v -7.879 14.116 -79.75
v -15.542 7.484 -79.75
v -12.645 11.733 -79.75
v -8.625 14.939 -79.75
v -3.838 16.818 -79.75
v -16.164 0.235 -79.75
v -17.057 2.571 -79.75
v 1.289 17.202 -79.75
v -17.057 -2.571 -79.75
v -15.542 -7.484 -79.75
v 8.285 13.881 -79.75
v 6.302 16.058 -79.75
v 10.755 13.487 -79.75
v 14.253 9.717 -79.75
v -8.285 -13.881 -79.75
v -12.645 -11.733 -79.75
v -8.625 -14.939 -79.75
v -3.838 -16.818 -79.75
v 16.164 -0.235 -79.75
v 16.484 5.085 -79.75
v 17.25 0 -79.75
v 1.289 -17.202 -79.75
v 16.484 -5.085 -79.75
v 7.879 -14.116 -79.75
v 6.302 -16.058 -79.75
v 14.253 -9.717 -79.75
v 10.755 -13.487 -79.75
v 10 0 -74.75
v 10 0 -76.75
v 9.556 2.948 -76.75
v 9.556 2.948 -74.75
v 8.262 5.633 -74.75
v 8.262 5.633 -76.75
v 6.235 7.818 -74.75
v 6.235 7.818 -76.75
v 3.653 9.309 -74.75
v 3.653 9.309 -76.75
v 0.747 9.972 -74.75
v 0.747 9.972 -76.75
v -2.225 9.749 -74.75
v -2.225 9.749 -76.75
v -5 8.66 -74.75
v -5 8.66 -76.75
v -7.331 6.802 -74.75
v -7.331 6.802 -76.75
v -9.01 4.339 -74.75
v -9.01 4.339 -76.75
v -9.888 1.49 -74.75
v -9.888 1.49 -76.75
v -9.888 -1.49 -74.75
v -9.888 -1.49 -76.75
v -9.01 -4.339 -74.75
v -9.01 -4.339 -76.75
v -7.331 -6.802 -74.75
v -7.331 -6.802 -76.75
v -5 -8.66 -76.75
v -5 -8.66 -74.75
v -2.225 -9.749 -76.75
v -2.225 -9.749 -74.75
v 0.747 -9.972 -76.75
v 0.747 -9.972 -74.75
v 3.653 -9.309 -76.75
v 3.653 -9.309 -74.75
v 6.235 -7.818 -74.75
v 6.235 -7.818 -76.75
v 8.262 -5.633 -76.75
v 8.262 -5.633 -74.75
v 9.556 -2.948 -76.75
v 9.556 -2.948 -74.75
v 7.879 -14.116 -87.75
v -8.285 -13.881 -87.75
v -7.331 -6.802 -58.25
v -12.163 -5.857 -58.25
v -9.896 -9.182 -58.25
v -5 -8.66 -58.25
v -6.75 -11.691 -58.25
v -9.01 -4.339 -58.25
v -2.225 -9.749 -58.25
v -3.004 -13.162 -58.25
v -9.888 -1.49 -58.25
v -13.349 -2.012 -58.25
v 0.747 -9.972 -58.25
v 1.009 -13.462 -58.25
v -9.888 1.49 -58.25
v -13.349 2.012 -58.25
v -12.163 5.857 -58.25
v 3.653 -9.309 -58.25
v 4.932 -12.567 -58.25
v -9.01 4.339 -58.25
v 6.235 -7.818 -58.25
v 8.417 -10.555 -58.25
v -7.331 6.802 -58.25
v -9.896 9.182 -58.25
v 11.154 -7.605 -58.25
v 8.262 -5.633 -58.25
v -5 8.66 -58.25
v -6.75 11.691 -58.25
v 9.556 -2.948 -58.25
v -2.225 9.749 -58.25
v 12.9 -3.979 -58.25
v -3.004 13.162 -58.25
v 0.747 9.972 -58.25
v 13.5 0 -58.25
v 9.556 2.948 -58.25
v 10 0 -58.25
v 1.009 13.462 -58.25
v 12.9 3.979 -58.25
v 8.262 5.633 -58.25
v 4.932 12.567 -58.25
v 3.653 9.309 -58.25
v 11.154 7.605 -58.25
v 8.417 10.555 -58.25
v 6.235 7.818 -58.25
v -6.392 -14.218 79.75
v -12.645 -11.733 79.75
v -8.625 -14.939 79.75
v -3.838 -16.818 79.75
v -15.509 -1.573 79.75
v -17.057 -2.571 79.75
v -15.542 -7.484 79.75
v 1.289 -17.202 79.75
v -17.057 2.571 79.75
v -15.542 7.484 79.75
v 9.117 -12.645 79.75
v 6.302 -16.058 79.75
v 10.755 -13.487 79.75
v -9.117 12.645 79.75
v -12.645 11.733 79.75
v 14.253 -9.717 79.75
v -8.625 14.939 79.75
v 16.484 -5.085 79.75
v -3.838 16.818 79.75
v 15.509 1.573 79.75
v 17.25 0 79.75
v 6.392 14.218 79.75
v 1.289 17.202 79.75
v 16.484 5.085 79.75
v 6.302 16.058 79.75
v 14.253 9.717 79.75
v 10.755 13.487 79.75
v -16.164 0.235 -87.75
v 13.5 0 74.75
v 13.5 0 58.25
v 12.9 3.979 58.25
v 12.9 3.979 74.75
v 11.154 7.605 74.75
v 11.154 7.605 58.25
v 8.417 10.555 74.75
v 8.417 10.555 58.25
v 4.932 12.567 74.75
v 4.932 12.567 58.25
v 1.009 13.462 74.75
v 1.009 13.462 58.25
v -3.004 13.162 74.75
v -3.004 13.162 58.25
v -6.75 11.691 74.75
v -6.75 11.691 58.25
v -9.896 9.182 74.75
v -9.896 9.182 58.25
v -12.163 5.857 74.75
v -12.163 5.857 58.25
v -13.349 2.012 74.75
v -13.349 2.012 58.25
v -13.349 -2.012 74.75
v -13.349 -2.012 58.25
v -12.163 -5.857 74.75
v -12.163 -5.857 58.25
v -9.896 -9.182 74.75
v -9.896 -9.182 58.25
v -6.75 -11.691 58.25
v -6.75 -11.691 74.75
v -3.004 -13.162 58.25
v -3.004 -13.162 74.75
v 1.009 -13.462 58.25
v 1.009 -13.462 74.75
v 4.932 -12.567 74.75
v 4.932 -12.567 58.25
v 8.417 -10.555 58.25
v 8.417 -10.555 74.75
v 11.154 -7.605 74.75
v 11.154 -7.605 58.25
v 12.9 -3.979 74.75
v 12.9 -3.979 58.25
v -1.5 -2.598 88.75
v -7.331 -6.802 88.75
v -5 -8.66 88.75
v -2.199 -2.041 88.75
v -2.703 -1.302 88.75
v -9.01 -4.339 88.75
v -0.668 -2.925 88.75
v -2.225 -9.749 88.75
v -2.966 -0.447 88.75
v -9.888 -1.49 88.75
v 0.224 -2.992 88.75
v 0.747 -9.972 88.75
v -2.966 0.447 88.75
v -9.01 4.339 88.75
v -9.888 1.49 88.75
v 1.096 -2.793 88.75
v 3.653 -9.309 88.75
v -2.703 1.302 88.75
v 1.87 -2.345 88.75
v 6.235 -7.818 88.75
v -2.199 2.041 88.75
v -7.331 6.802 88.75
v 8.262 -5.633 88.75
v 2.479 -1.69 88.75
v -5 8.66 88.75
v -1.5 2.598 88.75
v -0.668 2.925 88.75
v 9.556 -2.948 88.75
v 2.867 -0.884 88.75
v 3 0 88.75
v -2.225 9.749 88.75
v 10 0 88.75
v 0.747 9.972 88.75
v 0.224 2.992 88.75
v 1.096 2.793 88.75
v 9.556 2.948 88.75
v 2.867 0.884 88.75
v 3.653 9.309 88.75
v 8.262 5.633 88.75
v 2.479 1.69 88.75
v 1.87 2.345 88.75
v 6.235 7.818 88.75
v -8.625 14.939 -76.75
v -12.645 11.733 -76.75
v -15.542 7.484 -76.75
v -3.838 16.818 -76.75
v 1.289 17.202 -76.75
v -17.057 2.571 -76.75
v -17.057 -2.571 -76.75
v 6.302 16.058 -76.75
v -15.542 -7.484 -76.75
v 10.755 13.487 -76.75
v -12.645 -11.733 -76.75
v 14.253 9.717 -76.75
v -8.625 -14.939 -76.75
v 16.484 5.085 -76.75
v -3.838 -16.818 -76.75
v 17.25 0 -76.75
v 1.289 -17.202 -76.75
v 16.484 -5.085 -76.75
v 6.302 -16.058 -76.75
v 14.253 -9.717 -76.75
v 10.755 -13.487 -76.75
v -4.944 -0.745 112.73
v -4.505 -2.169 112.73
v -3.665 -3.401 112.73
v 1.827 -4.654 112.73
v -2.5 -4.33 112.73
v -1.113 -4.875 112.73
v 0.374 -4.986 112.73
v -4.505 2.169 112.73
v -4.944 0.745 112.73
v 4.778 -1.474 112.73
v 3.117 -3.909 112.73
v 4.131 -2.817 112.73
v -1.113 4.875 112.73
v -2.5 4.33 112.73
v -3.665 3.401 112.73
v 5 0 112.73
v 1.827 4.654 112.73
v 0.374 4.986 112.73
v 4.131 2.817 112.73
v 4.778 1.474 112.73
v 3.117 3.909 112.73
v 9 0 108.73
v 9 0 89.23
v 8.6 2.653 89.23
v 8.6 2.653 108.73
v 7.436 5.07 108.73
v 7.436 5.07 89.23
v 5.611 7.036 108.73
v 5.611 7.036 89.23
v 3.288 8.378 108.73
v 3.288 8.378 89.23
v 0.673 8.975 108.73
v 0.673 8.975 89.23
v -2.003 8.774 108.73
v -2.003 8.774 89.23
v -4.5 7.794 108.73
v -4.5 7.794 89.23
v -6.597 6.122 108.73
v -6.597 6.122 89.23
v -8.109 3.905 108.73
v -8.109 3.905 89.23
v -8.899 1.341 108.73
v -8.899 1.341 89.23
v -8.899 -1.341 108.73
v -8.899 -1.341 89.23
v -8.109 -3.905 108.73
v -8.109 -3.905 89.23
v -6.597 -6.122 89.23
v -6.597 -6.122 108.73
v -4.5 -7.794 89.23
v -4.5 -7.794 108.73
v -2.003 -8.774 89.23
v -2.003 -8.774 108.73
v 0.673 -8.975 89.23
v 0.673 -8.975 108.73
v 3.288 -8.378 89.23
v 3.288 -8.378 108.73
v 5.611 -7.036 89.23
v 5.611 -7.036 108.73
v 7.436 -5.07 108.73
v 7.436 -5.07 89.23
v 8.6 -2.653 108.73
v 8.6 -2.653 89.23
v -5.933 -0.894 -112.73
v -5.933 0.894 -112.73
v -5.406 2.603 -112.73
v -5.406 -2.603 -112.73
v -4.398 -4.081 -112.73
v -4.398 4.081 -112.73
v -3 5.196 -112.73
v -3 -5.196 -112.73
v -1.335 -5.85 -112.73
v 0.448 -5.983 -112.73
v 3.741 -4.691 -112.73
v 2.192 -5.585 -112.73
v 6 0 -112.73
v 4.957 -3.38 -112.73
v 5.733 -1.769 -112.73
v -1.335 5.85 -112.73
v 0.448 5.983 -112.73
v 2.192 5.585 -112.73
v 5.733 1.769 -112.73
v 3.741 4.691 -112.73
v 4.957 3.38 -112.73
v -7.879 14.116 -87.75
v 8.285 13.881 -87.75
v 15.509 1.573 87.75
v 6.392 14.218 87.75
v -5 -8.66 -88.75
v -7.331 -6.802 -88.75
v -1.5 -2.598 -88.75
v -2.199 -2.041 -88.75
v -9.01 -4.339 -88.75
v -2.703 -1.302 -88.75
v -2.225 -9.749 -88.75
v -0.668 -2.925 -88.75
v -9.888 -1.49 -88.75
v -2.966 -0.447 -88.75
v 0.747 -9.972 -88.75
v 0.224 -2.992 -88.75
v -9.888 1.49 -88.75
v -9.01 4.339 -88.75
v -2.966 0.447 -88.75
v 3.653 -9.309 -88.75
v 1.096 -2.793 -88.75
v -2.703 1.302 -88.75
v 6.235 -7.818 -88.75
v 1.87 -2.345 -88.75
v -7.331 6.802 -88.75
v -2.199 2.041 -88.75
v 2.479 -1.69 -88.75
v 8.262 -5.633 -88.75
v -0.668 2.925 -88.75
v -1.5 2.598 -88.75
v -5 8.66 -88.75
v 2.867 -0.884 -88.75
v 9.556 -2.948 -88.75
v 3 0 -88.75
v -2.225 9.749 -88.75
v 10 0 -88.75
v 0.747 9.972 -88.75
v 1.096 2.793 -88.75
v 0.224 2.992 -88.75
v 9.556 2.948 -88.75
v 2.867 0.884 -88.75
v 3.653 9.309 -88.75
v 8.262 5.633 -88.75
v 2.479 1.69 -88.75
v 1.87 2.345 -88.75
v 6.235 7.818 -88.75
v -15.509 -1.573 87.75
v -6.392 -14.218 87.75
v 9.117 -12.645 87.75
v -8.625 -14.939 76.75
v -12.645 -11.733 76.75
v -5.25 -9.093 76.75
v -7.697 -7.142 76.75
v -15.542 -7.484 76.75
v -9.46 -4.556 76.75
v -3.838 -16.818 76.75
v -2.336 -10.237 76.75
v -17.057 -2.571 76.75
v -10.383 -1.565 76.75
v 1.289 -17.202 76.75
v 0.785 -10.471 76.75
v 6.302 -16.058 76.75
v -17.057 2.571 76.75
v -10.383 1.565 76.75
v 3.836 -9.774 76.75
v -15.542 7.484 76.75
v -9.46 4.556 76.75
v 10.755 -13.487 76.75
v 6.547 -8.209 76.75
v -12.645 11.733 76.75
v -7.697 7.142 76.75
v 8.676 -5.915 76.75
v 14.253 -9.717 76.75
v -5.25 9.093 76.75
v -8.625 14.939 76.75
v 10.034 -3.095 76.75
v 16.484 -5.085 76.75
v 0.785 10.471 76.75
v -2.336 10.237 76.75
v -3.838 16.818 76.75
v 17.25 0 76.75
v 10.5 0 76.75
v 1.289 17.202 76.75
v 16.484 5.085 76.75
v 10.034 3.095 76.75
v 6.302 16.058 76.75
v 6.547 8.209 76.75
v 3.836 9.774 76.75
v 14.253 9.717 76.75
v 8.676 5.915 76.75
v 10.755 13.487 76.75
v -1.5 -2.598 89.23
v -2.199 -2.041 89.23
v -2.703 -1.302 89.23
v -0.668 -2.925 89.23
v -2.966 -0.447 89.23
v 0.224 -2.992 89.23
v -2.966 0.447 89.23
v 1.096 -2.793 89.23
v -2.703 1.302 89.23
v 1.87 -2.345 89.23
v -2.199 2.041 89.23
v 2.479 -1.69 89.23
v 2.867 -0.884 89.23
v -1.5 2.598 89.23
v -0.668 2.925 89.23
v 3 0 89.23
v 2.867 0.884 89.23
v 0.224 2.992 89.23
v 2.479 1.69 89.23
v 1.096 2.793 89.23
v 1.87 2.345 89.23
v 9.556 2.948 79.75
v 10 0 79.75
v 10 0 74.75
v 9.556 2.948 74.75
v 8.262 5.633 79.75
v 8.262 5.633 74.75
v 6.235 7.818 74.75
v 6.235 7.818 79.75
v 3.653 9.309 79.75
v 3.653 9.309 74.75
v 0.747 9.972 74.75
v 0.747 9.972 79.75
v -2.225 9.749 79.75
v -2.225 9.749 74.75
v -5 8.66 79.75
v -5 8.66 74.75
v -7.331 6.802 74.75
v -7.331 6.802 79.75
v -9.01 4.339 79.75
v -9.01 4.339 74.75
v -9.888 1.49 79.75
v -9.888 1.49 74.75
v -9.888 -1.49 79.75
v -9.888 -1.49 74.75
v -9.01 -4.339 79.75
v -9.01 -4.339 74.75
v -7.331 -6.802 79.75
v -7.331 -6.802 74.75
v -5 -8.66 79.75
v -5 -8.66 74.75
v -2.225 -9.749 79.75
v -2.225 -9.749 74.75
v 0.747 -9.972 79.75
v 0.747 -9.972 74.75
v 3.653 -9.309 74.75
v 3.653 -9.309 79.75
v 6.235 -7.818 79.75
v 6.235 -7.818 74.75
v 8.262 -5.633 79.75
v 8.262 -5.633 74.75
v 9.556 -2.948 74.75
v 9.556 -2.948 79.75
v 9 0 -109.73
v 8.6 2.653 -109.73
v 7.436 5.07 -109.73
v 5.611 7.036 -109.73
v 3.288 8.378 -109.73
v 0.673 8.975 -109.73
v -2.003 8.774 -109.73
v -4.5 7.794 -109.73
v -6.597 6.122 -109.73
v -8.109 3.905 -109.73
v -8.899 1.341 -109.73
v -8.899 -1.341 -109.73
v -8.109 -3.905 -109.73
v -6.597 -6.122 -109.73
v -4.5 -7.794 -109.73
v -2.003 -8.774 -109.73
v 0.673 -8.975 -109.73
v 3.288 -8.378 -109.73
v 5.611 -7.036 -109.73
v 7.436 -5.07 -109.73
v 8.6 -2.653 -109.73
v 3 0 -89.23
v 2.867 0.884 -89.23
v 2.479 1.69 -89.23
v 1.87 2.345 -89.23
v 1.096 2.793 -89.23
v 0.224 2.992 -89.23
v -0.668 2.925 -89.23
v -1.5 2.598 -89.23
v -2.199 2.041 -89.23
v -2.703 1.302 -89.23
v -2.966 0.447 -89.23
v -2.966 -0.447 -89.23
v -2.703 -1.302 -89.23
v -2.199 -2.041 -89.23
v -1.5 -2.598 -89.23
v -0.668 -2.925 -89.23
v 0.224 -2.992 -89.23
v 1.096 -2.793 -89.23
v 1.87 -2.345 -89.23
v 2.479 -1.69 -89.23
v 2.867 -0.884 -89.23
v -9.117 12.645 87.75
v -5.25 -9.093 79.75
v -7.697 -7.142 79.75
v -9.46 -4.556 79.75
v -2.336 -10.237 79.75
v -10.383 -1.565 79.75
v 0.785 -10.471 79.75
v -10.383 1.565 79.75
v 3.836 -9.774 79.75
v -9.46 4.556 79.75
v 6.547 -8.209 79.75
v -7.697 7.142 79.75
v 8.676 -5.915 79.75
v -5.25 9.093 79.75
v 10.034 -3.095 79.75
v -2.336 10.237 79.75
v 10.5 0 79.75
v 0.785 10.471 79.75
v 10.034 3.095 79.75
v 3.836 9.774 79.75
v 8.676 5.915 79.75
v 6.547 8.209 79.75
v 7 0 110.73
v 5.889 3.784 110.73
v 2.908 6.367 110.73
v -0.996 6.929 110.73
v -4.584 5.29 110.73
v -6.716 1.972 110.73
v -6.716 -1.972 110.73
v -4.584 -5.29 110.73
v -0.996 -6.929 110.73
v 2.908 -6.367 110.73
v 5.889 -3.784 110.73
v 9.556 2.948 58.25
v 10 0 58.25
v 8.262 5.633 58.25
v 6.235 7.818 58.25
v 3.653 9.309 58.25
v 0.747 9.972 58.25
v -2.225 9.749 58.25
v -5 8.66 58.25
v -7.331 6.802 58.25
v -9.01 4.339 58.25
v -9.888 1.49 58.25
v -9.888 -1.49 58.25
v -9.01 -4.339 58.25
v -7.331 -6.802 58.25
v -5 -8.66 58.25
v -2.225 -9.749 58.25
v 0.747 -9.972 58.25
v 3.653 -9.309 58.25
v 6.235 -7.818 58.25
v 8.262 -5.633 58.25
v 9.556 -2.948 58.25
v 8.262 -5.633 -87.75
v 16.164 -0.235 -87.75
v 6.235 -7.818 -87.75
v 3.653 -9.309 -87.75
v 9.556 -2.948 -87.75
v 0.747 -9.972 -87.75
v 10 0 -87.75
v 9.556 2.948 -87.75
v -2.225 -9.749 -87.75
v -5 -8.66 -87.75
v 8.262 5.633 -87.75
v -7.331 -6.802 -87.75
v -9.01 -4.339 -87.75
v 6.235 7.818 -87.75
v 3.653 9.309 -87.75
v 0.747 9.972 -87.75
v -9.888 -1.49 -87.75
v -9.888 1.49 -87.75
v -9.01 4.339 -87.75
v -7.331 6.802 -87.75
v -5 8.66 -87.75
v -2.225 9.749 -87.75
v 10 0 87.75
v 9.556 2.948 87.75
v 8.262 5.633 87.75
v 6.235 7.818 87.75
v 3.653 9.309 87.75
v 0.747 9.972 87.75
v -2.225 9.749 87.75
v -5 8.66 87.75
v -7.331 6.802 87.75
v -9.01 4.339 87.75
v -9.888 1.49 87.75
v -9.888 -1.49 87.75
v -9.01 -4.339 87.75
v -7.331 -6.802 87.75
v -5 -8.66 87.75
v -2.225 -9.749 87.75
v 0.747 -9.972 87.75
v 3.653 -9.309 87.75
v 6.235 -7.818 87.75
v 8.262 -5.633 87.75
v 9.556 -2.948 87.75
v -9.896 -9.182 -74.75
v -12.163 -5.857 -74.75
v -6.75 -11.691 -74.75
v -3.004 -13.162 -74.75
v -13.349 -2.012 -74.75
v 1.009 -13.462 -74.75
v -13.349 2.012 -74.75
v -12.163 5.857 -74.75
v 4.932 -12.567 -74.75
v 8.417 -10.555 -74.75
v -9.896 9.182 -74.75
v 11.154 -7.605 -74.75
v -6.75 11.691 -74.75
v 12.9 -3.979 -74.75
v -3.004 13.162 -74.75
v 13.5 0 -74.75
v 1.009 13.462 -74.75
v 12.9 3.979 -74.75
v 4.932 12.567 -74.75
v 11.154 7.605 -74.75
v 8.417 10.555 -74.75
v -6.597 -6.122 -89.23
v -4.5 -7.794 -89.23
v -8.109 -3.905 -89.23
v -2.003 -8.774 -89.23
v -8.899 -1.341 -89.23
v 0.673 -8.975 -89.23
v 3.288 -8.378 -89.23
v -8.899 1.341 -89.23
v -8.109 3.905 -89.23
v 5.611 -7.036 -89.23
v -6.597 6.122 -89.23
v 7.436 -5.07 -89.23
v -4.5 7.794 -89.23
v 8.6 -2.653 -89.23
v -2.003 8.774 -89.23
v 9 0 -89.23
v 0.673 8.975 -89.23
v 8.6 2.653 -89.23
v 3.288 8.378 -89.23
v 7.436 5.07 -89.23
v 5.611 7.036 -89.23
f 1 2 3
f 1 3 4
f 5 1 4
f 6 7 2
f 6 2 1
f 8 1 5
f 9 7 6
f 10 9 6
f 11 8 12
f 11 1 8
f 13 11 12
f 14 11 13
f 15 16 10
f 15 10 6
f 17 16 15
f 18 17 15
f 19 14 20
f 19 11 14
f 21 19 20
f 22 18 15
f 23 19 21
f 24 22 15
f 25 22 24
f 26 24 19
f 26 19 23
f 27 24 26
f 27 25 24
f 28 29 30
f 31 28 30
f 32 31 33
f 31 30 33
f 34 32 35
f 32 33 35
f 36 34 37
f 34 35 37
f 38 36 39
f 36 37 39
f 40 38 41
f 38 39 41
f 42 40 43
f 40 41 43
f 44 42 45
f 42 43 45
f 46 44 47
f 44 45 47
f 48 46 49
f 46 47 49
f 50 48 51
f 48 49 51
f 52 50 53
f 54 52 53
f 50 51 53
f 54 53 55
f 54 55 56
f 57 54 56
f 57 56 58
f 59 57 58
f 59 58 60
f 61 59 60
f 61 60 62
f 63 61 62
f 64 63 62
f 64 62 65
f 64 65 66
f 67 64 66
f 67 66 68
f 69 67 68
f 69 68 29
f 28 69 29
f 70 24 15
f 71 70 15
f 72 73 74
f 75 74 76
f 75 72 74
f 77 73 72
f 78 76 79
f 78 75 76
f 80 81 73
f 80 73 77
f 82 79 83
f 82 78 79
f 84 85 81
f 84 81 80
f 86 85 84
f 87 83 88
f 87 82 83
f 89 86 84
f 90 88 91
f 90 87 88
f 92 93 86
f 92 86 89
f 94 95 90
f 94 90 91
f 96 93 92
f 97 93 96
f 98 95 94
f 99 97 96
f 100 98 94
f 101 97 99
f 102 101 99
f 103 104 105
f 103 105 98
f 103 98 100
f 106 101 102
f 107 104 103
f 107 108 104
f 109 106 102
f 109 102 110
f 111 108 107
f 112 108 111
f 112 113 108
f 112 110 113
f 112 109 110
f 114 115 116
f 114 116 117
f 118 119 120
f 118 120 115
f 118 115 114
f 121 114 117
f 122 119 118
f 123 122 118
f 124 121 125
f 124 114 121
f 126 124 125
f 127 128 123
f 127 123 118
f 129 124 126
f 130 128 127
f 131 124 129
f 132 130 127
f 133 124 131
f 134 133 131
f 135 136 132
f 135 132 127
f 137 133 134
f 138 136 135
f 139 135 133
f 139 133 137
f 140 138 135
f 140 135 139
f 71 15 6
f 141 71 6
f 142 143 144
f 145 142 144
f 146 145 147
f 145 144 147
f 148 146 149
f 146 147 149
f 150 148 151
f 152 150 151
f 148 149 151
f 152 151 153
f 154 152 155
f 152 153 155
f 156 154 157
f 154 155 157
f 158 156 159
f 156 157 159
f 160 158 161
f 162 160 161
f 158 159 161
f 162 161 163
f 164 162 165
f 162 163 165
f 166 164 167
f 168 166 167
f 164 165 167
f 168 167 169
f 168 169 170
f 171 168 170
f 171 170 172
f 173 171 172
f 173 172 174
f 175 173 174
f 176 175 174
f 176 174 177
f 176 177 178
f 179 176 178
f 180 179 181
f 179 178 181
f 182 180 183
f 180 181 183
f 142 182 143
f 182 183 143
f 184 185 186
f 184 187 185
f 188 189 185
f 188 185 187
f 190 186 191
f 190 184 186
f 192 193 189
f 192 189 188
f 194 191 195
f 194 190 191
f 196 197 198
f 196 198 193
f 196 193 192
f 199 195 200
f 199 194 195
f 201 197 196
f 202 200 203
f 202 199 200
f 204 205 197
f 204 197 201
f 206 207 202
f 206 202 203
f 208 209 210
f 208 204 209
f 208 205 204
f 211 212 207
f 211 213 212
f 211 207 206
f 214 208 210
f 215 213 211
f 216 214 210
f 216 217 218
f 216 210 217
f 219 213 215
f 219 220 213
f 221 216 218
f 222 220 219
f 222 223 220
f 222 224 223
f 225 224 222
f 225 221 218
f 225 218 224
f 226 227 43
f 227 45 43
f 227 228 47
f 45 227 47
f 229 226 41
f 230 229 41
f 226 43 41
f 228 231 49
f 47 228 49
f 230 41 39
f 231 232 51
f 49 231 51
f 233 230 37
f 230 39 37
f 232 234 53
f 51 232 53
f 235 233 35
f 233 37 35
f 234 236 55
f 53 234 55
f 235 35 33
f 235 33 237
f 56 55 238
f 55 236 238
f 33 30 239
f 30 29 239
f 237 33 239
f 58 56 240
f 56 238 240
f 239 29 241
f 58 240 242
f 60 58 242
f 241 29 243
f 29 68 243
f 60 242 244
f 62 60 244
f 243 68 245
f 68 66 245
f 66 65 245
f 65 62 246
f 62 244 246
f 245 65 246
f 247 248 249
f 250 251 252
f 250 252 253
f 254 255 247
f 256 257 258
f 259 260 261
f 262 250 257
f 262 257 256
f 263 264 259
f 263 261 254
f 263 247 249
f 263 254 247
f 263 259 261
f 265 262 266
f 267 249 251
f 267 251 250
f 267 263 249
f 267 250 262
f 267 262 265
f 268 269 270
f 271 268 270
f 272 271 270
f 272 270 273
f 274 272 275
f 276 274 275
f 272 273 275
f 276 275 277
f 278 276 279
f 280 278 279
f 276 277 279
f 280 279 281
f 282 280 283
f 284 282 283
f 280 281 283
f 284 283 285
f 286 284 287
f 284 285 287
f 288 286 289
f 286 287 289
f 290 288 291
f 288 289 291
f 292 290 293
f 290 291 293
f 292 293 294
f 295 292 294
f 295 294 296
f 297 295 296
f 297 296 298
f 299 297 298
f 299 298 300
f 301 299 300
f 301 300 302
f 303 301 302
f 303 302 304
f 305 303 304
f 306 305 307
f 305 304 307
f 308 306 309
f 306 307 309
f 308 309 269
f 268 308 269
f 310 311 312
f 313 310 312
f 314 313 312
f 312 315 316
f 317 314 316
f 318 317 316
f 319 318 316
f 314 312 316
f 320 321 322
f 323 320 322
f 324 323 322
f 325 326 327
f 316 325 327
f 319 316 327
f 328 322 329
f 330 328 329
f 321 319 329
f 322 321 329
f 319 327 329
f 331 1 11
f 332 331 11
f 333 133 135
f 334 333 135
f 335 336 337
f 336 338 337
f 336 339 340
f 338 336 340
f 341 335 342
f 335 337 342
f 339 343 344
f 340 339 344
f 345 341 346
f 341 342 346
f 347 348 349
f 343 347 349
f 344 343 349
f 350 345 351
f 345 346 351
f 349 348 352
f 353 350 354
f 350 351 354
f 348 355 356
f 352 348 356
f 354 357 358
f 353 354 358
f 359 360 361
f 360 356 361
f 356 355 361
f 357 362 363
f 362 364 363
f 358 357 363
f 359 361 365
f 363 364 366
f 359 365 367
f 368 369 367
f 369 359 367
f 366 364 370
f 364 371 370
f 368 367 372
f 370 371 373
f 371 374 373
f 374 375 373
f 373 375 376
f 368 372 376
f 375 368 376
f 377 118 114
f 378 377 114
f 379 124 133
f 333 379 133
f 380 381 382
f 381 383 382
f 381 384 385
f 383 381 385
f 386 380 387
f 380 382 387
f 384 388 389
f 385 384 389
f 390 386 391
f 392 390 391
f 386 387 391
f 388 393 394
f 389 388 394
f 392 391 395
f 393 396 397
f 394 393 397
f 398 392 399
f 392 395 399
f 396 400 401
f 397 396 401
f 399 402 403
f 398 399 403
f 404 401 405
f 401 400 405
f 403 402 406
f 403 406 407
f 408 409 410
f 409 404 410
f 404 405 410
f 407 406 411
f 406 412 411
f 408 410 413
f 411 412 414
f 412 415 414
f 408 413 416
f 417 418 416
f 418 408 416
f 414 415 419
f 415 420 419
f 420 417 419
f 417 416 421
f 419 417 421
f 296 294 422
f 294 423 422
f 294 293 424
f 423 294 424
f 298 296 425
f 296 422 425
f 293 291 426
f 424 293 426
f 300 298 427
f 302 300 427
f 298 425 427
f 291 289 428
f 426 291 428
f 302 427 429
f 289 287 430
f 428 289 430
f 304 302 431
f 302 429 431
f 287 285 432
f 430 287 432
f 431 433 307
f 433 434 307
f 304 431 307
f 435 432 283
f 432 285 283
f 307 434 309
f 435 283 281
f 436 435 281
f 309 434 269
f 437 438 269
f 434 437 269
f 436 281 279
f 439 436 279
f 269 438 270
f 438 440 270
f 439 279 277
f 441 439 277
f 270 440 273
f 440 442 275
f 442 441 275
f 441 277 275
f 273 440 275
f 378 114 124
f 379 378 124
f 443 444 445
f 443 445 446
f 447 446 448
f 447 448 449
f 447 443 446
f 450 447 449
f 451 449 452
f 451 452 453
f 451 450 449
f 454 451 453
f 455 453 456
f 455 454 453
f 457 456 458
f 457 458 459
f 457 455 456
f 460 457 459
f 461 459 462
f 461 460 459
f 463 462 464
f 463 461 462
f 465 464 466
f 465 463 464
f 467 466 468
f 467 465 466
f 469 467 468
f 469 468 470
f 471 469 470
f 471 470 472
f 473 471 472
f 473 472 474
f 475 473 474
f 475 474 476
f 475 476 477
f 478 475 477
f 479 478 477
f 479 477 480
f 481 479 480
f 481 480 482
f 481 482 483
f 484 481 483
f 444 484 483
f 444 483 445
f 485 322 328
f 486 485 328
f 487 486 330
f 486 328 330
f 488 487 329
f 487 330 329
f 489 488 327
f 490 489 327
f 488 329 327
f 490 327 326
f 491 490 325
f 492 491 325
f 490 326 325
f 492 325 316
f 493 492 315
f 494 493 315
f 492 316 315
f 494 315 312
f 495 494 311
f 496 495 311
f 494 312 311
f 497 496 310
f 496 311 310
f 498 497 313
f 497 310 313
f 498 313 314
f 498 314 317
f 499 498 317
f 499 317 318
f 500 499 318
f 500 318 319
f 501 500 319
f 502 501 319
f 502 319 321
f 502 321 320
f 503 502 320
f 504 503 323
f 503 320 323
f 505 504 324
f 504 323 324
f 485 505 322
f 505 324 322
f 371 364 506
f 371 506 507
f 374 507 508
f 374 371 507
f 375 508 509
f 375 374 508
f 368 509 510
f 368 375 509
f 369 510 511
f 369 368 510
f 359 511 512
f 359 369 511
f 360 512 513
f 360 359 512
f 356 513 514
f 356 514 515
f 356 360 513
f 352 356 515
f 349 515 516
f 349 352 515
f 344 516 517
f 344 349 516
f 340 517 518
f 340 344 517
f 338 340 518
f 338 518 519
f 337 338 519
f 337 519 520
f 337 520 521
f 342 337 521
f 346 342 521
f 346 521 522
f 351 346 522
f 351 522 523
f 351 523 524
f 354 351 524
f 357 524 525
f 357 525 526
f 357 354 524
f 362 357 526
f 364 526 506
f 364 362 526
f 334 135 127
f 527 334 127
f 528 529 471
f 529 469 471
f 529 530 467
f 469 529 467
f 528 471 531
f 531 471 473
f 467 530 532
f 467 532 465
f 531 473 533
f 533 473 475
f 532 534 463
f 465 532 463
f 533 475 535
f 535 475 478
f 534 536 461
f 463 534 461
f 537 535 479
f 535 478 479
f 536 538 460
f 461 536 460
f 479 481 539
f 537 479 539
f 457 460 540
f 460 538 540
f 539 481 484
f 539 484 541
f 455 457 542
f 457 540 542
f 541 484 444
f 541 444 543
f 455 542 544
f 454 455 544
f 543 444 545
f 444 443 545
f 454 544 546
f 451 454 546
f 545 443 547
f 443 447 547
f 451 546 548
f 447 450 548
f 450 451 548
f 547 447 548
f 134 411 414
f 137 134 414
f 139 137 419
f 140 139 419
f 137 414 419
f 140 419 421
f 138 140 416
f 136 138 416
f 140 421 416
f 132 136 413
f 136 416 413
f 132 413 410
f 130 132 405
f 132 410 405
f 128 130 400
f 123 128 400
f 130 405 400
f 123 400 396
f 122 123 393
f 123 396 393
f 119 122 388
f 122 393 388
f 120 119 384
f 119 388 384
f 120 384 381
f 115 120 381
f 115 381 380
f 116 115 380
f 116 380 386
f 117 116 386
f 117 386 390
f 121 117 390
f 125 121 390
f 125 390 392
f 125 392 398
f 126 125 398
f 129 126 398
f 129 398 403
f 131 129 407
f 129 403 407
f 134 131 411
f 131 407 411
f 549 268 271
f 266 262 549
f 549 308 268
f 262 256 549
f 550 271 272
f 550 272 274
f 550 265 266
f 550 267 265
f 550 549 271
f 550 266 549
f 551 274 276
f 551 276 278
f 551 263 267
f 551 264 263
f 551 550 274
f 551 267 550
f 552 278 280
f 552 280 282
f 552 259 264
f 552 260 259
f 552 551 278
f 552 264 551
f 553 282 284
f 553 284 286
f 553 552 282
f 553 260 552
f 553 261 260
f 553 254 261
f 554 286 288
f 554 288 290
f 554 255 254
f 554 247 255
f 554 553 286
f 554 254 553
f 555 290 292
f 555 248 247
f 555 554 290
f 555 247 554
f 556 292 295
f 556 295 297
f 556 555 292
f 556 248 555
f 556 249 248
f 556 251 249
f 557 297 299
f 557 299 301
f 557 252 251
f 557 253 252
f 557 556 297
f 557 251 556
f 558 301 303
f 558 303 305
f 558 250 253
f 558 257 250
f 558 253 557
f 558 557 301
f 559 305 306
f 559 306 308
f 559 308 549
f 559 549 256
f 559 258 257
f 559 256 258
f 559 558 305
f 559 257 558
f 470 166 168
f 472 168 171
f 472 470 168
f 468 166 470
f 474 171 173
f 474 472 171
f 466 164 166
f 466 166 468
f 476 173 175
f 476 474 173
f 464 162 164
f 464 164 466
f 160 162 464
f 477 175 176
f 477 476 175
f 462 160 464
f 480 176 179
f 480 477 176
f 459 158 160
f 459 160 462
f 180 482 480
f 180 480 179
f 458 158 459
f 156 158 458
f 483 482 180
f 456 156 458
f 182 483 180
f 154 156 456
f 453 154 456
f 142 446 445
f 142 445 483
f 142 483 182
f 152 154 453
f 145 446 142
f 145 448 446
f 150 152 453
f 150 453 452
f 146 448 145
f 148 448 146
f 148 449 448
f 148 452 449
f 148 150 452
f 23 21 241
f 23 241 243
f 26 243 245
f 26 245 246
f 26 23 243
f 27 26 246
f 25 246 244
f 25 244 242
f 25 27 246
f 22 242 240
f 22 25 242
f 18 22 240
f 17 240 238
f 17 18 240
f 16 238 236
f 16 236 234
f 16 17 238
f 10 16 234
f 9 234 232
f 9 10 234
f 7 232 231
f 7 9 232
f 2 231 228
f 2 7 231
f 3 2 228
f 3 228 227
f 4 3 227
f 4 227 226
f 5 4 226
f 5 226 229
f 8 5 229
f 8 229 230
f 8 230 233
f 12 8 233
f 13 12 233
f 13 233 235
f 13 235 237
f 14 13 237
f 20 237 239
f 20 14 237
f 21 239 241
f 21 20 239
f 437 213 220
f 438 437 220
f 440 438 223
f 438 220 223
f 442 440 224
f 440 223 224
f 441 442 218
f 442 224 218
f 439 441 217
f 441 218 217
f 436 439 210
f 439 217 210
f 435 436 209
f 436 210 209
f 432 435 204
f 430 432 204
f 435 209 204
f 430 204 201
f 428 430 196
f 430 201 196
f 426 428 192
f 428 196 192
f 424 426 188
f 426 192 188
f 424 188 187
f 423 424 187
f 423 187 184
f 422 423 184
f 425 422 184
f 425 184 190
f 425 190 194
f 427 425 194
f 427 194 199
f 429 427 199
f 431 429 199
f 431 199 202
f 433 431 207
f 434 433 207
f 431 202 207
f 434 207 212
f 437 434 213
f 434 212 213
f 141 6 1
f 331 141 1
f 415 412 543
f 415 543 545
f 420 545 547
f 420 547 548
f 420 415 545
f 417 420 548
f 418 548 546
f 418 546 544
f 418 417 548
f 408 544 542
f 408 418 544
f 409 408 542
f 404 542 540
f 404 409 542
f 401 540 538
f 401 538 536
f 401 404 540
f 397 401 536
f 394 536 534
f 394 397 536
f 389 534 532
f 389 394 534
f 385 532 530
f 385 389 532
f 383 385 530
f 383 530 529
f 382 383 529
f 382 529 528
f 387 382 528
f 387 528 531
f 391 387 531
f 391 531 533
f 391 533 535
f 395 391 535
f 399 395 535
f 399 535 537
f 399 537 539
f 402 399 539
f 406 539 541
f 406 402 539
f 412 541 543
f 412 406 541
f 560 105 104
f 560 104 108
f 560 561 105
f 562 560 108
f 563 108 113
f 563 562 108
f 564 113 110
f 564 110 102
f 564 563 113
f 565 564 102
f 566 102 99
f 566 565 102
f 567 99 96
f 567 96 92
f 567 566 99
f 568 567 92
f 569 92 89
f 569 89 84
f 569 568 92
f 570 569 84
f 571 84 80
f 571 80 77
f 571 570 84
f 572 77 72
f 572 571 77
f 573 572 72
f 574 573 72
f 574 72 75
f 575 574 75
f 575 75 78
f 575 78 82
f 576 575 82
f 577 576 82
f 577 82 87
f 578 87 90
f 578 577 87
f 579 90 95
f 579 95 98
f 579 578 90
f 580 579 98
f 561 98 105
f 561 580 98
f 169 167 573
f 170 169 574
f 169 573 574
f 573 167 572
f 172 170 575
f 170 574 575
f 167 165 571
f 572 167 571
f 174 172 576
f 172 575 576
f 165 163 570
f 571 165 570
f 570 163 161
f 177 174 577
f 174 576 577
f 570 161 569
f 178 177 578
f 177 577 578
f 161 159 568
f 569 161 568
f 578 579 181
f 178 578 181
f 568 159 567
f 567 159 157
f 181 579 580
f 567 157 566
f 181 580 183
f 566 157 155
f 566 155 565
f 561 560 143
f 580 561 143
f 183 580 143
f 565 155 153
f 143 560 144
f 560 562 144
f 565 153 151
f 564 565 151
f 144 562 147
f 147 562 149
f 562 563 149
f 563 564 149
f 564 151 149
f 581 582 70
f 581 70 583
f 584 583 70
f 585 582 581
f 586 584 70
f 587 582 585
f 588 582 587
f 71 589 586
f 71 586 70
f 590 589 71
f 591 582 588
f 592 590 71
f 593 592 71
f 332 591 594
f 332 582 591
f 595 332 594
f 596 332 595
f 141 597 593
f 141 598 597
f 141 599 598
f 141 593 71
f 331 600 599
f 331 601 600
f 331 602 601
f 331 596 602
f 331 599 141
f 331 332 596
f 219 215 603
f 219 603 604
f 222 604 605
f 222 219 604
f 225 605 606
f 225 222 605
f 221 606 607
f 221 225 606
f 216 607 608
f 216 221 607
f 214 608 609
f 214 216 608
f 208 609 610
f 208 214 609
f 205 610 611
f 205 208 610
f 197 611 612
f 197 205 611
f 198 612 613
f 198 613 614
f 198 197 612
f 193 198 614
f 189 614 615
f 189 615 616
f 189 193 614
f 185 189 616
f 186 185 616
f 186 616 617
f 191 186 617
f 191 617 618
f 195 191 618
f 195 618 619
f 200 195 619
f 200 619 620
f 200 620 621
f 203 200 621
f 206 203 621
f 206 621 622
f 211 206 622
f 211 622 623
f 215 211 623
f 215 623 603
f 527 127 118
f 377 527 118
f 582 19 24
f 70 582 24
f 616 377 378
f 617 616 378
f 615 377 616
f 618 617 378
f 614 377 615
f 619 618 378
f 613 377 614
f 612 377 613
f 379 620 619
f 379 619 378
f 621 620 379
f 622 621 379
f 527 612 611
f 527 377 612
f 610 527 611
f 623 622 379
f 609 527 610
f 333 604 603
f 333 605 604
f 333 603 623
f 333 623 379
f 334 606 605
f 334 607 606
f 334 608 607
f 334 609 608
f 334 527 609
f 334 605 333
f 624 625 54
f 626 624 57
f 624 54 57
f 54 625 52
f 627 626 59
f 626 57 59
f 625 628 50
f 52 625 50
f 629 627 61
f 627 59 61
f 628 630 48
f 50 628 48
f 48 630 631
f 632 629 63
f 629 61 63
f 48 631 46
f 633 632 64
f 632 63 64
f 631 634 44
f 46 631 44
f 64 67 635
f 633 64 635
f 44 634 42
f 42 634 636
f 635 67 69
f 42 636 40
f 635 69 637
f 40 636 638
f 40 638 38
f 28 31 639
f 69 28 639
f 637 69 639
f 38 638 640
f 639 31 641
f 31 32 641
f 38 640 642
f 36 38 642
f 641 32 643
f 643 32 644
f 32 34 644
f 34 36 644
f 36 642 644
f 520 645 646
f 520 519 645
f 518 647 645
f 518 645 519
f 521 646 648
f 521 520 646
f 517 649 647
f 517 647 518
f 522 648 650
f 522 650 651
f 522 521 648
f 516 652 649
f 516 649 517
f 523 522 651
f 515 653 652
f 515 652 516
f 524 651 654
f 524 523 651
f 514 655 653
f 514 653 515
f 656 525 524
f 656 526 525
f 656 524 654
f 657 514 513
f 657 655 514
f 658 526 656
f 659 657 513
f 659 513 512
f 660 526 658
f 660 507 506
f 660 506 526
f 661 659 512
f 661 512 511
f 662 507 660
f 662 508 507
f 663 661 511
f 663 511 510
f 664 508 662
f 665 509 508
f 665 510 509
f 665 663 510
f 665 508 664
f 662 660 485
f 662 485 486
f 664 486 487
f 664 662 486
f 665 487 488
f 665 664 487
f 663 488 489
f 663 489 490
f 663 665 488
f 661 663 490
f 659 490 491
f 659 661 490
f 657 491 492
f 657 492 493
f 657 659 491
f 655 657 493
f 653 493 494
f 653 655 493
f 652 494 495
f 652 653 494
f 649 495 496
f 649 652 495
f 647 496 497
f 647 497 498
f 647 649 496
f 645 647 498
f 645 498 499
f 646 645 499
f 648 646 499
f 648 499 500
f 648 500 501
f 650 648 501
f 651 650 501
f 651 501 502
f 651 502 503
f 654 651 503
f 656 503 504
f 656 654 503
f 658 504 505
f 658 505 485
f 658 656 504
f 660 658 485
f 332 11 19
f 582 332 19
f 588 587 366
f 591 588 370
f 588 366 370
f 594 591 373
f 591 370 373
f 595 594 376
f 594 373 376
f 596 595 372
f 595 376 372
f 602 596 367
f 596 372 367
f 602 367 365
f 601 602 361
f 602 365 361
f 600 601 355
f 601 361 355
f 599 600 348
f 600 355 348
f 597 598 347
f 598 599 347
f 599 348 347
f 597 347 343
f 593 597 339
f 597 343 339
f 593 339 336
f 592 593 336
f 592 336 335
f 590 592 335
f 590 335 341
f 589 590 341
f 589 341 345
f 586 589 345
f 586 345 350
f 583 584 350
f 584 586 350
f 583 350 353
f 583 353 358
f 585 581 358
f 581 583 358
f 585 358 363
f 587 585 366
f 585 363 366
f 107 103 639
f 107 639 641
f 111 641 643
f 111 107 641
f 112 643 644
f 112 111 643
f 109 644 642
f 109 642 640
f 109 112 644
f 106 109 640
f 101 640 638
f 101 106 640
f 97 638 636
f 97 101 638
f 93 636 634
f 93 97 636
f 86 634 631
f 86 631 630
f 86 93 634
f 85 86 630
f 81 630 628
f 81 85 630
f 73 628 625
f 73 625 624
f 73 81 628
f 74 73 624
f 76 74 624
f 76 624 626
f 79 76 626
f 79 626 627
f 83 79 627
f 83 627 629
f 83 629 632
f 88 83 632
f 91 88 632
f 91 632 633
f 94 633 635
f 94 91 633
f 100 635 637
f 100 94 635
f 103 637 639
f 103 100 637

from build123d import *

# Parameters (mm, degrees)
SKETCH_1_R      = 10
EXTRUDE_1_DEPTH = 58.25
SKETCH_2_R      = 13.5
EXTRUDE_2_DEPTH = 16.5
EXTRUDE_START   = 14
SKETCH_3_R      = 10
EXTRUDE_3_DEPTH = 14
SKETCH_4_R      = 3
EXTRUDE_4_DEPTH = 0.48
SKETCH_5_R      = 9
EXTRUDE_5_DEPTH = 23.5
CHAMFER_1_SIZE  = 4
SKETCH_6_R      = 17.25
SKETCH_6_R_2    = 10.5
EXTRUDE_6_DEPTH = 3
EXTRUDE_7_DEPTH = 8
CHAMFER_2_SIZE  = 3
EXTRUDE_START_2 = 3
SKETCH_8_R      = 17.25
EXTRUDE_8_DEPTH = 3
EXTRUDE_9_DEPTH = 8


with BuildPart() as part:
    # 草图1 → 凸台-拉伸1 (new, symmetric)
    with BuildSketch(Plane.XY):
        Circle(SKETCH_1_R)
    extrude(amount=EXTRUDE_1_DEPTH, both=True)

    # 草图2 → 凸台-拉伸2 (add)
    with BuildSketch(Plane.XY.offset(58.25)):
        Circle(SKETCH_2_R)
    extrude_2 = extrude(amount=EXTRUDE_2_DEPTH)

    # 草图3 → 凸台-拉伸3 (add)
    with BuildSketch(Plane.XY.offset(74.75).offset(EXTRUDE_START)):
        Circle(SKETCH_3_R)
    extrude_3 = extrude(amount=-EXTRUDE_3_DEPTH)

    # 草图4 → 凸台-拉伸4 (add)
    with BuildSketch(Plane.XY.offset(88.75)):
        Circle(SKETCH_4_R)
    extrude_4 = extrude(amount=EXTRUDE_4_DEPTH)

    # 草图5 → 凸台-拉伸5 (add)
    with BuildSketch(Plane.XY.offset(89.23)):
        Circle(SKETCH_5_R)
    extrude_5 = extrude(amount=EXTRUDE_5_DEPTH)

    # 倒角1
    chamfer_1_edges = [part.edges().sort_by_distance(p)[0] for p in [
        (-9, 0, 112.73),
    ]]
    chamfer(chamfer_1_edges, length=CHAMFER_1_SIZE)



with BuildPart() as body_2:
    # 草图6 → 凸台-拉伸6 (new body)
    with BuildSketch(Plane.XY.offset(76.75)):
        Circle(SKETCH_6_R)
        Circle(SKETCH_6_R_2, mode=Mode.SUBTRACT)
    extrude(amount=EXTRUDE_6_DEPTH)


with BuildPart() as part_1:
    add(part.part)

    add(body_2.part)  # 凸台-拉伸7 merges body 2
    # 草图7 → 凸台-拉伸7 (add)
    with BuildSketch(Plane.XY.offset(79.75)):
        Polygon((6.392369232, 14.217510879), (-9.116540984, 12.644709585), (-15.508910216, -1.572801294), (-6.392369232, -14.217510879), (9.116540984, -12.644709585), (15.508910216, 1.572801294), align=None)
    extrude(amount=EXTRUDE_7_DEPTH)

    # 镜向3: 凸台-拉伸2, 凸台-拉伸3, 凸台-拉伸4, 凸台-拉伸5 across plane
    add(extrude_2.mirror(Plane.XY))
    add(extrude_3.mirror(Plane.XY))
    add(extrude_4.mirror(Plane.XY))
    add(extrude_5.mirror(Plane.XY))

    # 倒角2
    chamfer_2_edges = [part_1.edges().sort_by_distance(p)[0] for p in [
        (-9, 0, -112.73),
    ]]
    chamfer(chamfer_2_edges, length=CHAMFER_2_SIZE)

    # 草图8 → 凸台-拉伸8 (add)
    with BuildSketch(Plane(origin=(0, 0, -76.75), x_dir=(-1, 0, 0), z_dir=(0, 0, -1)).offset(EXTRUDE_START_2)):
        with Locations(Location((0, 0, 0), (0, 0, 180))):
            Circle(SKETCH_8_R)
    extrude(amount=-EXTRUDE_8_DEPTH)

    # 草图9 → 凸台-拉伸9 (add)
    with BuildSketch(Plane(origin=(0, 0, -79.75), x_dir=(-1, 0, 0), z_dir=(0, 0, -1))):
        Polygon((7.878667531, 14.115945993), (-8.285434063, 13.881099226), (-16.164101594, -0.234846767), (-7.878667531, -14.115945993), (8.285434063, -13.881099226), (16.164101594, 0.234846767), align=None)
    extrude(amount=EXTRUDE_9_DEPTH)


solid = part_1.part
